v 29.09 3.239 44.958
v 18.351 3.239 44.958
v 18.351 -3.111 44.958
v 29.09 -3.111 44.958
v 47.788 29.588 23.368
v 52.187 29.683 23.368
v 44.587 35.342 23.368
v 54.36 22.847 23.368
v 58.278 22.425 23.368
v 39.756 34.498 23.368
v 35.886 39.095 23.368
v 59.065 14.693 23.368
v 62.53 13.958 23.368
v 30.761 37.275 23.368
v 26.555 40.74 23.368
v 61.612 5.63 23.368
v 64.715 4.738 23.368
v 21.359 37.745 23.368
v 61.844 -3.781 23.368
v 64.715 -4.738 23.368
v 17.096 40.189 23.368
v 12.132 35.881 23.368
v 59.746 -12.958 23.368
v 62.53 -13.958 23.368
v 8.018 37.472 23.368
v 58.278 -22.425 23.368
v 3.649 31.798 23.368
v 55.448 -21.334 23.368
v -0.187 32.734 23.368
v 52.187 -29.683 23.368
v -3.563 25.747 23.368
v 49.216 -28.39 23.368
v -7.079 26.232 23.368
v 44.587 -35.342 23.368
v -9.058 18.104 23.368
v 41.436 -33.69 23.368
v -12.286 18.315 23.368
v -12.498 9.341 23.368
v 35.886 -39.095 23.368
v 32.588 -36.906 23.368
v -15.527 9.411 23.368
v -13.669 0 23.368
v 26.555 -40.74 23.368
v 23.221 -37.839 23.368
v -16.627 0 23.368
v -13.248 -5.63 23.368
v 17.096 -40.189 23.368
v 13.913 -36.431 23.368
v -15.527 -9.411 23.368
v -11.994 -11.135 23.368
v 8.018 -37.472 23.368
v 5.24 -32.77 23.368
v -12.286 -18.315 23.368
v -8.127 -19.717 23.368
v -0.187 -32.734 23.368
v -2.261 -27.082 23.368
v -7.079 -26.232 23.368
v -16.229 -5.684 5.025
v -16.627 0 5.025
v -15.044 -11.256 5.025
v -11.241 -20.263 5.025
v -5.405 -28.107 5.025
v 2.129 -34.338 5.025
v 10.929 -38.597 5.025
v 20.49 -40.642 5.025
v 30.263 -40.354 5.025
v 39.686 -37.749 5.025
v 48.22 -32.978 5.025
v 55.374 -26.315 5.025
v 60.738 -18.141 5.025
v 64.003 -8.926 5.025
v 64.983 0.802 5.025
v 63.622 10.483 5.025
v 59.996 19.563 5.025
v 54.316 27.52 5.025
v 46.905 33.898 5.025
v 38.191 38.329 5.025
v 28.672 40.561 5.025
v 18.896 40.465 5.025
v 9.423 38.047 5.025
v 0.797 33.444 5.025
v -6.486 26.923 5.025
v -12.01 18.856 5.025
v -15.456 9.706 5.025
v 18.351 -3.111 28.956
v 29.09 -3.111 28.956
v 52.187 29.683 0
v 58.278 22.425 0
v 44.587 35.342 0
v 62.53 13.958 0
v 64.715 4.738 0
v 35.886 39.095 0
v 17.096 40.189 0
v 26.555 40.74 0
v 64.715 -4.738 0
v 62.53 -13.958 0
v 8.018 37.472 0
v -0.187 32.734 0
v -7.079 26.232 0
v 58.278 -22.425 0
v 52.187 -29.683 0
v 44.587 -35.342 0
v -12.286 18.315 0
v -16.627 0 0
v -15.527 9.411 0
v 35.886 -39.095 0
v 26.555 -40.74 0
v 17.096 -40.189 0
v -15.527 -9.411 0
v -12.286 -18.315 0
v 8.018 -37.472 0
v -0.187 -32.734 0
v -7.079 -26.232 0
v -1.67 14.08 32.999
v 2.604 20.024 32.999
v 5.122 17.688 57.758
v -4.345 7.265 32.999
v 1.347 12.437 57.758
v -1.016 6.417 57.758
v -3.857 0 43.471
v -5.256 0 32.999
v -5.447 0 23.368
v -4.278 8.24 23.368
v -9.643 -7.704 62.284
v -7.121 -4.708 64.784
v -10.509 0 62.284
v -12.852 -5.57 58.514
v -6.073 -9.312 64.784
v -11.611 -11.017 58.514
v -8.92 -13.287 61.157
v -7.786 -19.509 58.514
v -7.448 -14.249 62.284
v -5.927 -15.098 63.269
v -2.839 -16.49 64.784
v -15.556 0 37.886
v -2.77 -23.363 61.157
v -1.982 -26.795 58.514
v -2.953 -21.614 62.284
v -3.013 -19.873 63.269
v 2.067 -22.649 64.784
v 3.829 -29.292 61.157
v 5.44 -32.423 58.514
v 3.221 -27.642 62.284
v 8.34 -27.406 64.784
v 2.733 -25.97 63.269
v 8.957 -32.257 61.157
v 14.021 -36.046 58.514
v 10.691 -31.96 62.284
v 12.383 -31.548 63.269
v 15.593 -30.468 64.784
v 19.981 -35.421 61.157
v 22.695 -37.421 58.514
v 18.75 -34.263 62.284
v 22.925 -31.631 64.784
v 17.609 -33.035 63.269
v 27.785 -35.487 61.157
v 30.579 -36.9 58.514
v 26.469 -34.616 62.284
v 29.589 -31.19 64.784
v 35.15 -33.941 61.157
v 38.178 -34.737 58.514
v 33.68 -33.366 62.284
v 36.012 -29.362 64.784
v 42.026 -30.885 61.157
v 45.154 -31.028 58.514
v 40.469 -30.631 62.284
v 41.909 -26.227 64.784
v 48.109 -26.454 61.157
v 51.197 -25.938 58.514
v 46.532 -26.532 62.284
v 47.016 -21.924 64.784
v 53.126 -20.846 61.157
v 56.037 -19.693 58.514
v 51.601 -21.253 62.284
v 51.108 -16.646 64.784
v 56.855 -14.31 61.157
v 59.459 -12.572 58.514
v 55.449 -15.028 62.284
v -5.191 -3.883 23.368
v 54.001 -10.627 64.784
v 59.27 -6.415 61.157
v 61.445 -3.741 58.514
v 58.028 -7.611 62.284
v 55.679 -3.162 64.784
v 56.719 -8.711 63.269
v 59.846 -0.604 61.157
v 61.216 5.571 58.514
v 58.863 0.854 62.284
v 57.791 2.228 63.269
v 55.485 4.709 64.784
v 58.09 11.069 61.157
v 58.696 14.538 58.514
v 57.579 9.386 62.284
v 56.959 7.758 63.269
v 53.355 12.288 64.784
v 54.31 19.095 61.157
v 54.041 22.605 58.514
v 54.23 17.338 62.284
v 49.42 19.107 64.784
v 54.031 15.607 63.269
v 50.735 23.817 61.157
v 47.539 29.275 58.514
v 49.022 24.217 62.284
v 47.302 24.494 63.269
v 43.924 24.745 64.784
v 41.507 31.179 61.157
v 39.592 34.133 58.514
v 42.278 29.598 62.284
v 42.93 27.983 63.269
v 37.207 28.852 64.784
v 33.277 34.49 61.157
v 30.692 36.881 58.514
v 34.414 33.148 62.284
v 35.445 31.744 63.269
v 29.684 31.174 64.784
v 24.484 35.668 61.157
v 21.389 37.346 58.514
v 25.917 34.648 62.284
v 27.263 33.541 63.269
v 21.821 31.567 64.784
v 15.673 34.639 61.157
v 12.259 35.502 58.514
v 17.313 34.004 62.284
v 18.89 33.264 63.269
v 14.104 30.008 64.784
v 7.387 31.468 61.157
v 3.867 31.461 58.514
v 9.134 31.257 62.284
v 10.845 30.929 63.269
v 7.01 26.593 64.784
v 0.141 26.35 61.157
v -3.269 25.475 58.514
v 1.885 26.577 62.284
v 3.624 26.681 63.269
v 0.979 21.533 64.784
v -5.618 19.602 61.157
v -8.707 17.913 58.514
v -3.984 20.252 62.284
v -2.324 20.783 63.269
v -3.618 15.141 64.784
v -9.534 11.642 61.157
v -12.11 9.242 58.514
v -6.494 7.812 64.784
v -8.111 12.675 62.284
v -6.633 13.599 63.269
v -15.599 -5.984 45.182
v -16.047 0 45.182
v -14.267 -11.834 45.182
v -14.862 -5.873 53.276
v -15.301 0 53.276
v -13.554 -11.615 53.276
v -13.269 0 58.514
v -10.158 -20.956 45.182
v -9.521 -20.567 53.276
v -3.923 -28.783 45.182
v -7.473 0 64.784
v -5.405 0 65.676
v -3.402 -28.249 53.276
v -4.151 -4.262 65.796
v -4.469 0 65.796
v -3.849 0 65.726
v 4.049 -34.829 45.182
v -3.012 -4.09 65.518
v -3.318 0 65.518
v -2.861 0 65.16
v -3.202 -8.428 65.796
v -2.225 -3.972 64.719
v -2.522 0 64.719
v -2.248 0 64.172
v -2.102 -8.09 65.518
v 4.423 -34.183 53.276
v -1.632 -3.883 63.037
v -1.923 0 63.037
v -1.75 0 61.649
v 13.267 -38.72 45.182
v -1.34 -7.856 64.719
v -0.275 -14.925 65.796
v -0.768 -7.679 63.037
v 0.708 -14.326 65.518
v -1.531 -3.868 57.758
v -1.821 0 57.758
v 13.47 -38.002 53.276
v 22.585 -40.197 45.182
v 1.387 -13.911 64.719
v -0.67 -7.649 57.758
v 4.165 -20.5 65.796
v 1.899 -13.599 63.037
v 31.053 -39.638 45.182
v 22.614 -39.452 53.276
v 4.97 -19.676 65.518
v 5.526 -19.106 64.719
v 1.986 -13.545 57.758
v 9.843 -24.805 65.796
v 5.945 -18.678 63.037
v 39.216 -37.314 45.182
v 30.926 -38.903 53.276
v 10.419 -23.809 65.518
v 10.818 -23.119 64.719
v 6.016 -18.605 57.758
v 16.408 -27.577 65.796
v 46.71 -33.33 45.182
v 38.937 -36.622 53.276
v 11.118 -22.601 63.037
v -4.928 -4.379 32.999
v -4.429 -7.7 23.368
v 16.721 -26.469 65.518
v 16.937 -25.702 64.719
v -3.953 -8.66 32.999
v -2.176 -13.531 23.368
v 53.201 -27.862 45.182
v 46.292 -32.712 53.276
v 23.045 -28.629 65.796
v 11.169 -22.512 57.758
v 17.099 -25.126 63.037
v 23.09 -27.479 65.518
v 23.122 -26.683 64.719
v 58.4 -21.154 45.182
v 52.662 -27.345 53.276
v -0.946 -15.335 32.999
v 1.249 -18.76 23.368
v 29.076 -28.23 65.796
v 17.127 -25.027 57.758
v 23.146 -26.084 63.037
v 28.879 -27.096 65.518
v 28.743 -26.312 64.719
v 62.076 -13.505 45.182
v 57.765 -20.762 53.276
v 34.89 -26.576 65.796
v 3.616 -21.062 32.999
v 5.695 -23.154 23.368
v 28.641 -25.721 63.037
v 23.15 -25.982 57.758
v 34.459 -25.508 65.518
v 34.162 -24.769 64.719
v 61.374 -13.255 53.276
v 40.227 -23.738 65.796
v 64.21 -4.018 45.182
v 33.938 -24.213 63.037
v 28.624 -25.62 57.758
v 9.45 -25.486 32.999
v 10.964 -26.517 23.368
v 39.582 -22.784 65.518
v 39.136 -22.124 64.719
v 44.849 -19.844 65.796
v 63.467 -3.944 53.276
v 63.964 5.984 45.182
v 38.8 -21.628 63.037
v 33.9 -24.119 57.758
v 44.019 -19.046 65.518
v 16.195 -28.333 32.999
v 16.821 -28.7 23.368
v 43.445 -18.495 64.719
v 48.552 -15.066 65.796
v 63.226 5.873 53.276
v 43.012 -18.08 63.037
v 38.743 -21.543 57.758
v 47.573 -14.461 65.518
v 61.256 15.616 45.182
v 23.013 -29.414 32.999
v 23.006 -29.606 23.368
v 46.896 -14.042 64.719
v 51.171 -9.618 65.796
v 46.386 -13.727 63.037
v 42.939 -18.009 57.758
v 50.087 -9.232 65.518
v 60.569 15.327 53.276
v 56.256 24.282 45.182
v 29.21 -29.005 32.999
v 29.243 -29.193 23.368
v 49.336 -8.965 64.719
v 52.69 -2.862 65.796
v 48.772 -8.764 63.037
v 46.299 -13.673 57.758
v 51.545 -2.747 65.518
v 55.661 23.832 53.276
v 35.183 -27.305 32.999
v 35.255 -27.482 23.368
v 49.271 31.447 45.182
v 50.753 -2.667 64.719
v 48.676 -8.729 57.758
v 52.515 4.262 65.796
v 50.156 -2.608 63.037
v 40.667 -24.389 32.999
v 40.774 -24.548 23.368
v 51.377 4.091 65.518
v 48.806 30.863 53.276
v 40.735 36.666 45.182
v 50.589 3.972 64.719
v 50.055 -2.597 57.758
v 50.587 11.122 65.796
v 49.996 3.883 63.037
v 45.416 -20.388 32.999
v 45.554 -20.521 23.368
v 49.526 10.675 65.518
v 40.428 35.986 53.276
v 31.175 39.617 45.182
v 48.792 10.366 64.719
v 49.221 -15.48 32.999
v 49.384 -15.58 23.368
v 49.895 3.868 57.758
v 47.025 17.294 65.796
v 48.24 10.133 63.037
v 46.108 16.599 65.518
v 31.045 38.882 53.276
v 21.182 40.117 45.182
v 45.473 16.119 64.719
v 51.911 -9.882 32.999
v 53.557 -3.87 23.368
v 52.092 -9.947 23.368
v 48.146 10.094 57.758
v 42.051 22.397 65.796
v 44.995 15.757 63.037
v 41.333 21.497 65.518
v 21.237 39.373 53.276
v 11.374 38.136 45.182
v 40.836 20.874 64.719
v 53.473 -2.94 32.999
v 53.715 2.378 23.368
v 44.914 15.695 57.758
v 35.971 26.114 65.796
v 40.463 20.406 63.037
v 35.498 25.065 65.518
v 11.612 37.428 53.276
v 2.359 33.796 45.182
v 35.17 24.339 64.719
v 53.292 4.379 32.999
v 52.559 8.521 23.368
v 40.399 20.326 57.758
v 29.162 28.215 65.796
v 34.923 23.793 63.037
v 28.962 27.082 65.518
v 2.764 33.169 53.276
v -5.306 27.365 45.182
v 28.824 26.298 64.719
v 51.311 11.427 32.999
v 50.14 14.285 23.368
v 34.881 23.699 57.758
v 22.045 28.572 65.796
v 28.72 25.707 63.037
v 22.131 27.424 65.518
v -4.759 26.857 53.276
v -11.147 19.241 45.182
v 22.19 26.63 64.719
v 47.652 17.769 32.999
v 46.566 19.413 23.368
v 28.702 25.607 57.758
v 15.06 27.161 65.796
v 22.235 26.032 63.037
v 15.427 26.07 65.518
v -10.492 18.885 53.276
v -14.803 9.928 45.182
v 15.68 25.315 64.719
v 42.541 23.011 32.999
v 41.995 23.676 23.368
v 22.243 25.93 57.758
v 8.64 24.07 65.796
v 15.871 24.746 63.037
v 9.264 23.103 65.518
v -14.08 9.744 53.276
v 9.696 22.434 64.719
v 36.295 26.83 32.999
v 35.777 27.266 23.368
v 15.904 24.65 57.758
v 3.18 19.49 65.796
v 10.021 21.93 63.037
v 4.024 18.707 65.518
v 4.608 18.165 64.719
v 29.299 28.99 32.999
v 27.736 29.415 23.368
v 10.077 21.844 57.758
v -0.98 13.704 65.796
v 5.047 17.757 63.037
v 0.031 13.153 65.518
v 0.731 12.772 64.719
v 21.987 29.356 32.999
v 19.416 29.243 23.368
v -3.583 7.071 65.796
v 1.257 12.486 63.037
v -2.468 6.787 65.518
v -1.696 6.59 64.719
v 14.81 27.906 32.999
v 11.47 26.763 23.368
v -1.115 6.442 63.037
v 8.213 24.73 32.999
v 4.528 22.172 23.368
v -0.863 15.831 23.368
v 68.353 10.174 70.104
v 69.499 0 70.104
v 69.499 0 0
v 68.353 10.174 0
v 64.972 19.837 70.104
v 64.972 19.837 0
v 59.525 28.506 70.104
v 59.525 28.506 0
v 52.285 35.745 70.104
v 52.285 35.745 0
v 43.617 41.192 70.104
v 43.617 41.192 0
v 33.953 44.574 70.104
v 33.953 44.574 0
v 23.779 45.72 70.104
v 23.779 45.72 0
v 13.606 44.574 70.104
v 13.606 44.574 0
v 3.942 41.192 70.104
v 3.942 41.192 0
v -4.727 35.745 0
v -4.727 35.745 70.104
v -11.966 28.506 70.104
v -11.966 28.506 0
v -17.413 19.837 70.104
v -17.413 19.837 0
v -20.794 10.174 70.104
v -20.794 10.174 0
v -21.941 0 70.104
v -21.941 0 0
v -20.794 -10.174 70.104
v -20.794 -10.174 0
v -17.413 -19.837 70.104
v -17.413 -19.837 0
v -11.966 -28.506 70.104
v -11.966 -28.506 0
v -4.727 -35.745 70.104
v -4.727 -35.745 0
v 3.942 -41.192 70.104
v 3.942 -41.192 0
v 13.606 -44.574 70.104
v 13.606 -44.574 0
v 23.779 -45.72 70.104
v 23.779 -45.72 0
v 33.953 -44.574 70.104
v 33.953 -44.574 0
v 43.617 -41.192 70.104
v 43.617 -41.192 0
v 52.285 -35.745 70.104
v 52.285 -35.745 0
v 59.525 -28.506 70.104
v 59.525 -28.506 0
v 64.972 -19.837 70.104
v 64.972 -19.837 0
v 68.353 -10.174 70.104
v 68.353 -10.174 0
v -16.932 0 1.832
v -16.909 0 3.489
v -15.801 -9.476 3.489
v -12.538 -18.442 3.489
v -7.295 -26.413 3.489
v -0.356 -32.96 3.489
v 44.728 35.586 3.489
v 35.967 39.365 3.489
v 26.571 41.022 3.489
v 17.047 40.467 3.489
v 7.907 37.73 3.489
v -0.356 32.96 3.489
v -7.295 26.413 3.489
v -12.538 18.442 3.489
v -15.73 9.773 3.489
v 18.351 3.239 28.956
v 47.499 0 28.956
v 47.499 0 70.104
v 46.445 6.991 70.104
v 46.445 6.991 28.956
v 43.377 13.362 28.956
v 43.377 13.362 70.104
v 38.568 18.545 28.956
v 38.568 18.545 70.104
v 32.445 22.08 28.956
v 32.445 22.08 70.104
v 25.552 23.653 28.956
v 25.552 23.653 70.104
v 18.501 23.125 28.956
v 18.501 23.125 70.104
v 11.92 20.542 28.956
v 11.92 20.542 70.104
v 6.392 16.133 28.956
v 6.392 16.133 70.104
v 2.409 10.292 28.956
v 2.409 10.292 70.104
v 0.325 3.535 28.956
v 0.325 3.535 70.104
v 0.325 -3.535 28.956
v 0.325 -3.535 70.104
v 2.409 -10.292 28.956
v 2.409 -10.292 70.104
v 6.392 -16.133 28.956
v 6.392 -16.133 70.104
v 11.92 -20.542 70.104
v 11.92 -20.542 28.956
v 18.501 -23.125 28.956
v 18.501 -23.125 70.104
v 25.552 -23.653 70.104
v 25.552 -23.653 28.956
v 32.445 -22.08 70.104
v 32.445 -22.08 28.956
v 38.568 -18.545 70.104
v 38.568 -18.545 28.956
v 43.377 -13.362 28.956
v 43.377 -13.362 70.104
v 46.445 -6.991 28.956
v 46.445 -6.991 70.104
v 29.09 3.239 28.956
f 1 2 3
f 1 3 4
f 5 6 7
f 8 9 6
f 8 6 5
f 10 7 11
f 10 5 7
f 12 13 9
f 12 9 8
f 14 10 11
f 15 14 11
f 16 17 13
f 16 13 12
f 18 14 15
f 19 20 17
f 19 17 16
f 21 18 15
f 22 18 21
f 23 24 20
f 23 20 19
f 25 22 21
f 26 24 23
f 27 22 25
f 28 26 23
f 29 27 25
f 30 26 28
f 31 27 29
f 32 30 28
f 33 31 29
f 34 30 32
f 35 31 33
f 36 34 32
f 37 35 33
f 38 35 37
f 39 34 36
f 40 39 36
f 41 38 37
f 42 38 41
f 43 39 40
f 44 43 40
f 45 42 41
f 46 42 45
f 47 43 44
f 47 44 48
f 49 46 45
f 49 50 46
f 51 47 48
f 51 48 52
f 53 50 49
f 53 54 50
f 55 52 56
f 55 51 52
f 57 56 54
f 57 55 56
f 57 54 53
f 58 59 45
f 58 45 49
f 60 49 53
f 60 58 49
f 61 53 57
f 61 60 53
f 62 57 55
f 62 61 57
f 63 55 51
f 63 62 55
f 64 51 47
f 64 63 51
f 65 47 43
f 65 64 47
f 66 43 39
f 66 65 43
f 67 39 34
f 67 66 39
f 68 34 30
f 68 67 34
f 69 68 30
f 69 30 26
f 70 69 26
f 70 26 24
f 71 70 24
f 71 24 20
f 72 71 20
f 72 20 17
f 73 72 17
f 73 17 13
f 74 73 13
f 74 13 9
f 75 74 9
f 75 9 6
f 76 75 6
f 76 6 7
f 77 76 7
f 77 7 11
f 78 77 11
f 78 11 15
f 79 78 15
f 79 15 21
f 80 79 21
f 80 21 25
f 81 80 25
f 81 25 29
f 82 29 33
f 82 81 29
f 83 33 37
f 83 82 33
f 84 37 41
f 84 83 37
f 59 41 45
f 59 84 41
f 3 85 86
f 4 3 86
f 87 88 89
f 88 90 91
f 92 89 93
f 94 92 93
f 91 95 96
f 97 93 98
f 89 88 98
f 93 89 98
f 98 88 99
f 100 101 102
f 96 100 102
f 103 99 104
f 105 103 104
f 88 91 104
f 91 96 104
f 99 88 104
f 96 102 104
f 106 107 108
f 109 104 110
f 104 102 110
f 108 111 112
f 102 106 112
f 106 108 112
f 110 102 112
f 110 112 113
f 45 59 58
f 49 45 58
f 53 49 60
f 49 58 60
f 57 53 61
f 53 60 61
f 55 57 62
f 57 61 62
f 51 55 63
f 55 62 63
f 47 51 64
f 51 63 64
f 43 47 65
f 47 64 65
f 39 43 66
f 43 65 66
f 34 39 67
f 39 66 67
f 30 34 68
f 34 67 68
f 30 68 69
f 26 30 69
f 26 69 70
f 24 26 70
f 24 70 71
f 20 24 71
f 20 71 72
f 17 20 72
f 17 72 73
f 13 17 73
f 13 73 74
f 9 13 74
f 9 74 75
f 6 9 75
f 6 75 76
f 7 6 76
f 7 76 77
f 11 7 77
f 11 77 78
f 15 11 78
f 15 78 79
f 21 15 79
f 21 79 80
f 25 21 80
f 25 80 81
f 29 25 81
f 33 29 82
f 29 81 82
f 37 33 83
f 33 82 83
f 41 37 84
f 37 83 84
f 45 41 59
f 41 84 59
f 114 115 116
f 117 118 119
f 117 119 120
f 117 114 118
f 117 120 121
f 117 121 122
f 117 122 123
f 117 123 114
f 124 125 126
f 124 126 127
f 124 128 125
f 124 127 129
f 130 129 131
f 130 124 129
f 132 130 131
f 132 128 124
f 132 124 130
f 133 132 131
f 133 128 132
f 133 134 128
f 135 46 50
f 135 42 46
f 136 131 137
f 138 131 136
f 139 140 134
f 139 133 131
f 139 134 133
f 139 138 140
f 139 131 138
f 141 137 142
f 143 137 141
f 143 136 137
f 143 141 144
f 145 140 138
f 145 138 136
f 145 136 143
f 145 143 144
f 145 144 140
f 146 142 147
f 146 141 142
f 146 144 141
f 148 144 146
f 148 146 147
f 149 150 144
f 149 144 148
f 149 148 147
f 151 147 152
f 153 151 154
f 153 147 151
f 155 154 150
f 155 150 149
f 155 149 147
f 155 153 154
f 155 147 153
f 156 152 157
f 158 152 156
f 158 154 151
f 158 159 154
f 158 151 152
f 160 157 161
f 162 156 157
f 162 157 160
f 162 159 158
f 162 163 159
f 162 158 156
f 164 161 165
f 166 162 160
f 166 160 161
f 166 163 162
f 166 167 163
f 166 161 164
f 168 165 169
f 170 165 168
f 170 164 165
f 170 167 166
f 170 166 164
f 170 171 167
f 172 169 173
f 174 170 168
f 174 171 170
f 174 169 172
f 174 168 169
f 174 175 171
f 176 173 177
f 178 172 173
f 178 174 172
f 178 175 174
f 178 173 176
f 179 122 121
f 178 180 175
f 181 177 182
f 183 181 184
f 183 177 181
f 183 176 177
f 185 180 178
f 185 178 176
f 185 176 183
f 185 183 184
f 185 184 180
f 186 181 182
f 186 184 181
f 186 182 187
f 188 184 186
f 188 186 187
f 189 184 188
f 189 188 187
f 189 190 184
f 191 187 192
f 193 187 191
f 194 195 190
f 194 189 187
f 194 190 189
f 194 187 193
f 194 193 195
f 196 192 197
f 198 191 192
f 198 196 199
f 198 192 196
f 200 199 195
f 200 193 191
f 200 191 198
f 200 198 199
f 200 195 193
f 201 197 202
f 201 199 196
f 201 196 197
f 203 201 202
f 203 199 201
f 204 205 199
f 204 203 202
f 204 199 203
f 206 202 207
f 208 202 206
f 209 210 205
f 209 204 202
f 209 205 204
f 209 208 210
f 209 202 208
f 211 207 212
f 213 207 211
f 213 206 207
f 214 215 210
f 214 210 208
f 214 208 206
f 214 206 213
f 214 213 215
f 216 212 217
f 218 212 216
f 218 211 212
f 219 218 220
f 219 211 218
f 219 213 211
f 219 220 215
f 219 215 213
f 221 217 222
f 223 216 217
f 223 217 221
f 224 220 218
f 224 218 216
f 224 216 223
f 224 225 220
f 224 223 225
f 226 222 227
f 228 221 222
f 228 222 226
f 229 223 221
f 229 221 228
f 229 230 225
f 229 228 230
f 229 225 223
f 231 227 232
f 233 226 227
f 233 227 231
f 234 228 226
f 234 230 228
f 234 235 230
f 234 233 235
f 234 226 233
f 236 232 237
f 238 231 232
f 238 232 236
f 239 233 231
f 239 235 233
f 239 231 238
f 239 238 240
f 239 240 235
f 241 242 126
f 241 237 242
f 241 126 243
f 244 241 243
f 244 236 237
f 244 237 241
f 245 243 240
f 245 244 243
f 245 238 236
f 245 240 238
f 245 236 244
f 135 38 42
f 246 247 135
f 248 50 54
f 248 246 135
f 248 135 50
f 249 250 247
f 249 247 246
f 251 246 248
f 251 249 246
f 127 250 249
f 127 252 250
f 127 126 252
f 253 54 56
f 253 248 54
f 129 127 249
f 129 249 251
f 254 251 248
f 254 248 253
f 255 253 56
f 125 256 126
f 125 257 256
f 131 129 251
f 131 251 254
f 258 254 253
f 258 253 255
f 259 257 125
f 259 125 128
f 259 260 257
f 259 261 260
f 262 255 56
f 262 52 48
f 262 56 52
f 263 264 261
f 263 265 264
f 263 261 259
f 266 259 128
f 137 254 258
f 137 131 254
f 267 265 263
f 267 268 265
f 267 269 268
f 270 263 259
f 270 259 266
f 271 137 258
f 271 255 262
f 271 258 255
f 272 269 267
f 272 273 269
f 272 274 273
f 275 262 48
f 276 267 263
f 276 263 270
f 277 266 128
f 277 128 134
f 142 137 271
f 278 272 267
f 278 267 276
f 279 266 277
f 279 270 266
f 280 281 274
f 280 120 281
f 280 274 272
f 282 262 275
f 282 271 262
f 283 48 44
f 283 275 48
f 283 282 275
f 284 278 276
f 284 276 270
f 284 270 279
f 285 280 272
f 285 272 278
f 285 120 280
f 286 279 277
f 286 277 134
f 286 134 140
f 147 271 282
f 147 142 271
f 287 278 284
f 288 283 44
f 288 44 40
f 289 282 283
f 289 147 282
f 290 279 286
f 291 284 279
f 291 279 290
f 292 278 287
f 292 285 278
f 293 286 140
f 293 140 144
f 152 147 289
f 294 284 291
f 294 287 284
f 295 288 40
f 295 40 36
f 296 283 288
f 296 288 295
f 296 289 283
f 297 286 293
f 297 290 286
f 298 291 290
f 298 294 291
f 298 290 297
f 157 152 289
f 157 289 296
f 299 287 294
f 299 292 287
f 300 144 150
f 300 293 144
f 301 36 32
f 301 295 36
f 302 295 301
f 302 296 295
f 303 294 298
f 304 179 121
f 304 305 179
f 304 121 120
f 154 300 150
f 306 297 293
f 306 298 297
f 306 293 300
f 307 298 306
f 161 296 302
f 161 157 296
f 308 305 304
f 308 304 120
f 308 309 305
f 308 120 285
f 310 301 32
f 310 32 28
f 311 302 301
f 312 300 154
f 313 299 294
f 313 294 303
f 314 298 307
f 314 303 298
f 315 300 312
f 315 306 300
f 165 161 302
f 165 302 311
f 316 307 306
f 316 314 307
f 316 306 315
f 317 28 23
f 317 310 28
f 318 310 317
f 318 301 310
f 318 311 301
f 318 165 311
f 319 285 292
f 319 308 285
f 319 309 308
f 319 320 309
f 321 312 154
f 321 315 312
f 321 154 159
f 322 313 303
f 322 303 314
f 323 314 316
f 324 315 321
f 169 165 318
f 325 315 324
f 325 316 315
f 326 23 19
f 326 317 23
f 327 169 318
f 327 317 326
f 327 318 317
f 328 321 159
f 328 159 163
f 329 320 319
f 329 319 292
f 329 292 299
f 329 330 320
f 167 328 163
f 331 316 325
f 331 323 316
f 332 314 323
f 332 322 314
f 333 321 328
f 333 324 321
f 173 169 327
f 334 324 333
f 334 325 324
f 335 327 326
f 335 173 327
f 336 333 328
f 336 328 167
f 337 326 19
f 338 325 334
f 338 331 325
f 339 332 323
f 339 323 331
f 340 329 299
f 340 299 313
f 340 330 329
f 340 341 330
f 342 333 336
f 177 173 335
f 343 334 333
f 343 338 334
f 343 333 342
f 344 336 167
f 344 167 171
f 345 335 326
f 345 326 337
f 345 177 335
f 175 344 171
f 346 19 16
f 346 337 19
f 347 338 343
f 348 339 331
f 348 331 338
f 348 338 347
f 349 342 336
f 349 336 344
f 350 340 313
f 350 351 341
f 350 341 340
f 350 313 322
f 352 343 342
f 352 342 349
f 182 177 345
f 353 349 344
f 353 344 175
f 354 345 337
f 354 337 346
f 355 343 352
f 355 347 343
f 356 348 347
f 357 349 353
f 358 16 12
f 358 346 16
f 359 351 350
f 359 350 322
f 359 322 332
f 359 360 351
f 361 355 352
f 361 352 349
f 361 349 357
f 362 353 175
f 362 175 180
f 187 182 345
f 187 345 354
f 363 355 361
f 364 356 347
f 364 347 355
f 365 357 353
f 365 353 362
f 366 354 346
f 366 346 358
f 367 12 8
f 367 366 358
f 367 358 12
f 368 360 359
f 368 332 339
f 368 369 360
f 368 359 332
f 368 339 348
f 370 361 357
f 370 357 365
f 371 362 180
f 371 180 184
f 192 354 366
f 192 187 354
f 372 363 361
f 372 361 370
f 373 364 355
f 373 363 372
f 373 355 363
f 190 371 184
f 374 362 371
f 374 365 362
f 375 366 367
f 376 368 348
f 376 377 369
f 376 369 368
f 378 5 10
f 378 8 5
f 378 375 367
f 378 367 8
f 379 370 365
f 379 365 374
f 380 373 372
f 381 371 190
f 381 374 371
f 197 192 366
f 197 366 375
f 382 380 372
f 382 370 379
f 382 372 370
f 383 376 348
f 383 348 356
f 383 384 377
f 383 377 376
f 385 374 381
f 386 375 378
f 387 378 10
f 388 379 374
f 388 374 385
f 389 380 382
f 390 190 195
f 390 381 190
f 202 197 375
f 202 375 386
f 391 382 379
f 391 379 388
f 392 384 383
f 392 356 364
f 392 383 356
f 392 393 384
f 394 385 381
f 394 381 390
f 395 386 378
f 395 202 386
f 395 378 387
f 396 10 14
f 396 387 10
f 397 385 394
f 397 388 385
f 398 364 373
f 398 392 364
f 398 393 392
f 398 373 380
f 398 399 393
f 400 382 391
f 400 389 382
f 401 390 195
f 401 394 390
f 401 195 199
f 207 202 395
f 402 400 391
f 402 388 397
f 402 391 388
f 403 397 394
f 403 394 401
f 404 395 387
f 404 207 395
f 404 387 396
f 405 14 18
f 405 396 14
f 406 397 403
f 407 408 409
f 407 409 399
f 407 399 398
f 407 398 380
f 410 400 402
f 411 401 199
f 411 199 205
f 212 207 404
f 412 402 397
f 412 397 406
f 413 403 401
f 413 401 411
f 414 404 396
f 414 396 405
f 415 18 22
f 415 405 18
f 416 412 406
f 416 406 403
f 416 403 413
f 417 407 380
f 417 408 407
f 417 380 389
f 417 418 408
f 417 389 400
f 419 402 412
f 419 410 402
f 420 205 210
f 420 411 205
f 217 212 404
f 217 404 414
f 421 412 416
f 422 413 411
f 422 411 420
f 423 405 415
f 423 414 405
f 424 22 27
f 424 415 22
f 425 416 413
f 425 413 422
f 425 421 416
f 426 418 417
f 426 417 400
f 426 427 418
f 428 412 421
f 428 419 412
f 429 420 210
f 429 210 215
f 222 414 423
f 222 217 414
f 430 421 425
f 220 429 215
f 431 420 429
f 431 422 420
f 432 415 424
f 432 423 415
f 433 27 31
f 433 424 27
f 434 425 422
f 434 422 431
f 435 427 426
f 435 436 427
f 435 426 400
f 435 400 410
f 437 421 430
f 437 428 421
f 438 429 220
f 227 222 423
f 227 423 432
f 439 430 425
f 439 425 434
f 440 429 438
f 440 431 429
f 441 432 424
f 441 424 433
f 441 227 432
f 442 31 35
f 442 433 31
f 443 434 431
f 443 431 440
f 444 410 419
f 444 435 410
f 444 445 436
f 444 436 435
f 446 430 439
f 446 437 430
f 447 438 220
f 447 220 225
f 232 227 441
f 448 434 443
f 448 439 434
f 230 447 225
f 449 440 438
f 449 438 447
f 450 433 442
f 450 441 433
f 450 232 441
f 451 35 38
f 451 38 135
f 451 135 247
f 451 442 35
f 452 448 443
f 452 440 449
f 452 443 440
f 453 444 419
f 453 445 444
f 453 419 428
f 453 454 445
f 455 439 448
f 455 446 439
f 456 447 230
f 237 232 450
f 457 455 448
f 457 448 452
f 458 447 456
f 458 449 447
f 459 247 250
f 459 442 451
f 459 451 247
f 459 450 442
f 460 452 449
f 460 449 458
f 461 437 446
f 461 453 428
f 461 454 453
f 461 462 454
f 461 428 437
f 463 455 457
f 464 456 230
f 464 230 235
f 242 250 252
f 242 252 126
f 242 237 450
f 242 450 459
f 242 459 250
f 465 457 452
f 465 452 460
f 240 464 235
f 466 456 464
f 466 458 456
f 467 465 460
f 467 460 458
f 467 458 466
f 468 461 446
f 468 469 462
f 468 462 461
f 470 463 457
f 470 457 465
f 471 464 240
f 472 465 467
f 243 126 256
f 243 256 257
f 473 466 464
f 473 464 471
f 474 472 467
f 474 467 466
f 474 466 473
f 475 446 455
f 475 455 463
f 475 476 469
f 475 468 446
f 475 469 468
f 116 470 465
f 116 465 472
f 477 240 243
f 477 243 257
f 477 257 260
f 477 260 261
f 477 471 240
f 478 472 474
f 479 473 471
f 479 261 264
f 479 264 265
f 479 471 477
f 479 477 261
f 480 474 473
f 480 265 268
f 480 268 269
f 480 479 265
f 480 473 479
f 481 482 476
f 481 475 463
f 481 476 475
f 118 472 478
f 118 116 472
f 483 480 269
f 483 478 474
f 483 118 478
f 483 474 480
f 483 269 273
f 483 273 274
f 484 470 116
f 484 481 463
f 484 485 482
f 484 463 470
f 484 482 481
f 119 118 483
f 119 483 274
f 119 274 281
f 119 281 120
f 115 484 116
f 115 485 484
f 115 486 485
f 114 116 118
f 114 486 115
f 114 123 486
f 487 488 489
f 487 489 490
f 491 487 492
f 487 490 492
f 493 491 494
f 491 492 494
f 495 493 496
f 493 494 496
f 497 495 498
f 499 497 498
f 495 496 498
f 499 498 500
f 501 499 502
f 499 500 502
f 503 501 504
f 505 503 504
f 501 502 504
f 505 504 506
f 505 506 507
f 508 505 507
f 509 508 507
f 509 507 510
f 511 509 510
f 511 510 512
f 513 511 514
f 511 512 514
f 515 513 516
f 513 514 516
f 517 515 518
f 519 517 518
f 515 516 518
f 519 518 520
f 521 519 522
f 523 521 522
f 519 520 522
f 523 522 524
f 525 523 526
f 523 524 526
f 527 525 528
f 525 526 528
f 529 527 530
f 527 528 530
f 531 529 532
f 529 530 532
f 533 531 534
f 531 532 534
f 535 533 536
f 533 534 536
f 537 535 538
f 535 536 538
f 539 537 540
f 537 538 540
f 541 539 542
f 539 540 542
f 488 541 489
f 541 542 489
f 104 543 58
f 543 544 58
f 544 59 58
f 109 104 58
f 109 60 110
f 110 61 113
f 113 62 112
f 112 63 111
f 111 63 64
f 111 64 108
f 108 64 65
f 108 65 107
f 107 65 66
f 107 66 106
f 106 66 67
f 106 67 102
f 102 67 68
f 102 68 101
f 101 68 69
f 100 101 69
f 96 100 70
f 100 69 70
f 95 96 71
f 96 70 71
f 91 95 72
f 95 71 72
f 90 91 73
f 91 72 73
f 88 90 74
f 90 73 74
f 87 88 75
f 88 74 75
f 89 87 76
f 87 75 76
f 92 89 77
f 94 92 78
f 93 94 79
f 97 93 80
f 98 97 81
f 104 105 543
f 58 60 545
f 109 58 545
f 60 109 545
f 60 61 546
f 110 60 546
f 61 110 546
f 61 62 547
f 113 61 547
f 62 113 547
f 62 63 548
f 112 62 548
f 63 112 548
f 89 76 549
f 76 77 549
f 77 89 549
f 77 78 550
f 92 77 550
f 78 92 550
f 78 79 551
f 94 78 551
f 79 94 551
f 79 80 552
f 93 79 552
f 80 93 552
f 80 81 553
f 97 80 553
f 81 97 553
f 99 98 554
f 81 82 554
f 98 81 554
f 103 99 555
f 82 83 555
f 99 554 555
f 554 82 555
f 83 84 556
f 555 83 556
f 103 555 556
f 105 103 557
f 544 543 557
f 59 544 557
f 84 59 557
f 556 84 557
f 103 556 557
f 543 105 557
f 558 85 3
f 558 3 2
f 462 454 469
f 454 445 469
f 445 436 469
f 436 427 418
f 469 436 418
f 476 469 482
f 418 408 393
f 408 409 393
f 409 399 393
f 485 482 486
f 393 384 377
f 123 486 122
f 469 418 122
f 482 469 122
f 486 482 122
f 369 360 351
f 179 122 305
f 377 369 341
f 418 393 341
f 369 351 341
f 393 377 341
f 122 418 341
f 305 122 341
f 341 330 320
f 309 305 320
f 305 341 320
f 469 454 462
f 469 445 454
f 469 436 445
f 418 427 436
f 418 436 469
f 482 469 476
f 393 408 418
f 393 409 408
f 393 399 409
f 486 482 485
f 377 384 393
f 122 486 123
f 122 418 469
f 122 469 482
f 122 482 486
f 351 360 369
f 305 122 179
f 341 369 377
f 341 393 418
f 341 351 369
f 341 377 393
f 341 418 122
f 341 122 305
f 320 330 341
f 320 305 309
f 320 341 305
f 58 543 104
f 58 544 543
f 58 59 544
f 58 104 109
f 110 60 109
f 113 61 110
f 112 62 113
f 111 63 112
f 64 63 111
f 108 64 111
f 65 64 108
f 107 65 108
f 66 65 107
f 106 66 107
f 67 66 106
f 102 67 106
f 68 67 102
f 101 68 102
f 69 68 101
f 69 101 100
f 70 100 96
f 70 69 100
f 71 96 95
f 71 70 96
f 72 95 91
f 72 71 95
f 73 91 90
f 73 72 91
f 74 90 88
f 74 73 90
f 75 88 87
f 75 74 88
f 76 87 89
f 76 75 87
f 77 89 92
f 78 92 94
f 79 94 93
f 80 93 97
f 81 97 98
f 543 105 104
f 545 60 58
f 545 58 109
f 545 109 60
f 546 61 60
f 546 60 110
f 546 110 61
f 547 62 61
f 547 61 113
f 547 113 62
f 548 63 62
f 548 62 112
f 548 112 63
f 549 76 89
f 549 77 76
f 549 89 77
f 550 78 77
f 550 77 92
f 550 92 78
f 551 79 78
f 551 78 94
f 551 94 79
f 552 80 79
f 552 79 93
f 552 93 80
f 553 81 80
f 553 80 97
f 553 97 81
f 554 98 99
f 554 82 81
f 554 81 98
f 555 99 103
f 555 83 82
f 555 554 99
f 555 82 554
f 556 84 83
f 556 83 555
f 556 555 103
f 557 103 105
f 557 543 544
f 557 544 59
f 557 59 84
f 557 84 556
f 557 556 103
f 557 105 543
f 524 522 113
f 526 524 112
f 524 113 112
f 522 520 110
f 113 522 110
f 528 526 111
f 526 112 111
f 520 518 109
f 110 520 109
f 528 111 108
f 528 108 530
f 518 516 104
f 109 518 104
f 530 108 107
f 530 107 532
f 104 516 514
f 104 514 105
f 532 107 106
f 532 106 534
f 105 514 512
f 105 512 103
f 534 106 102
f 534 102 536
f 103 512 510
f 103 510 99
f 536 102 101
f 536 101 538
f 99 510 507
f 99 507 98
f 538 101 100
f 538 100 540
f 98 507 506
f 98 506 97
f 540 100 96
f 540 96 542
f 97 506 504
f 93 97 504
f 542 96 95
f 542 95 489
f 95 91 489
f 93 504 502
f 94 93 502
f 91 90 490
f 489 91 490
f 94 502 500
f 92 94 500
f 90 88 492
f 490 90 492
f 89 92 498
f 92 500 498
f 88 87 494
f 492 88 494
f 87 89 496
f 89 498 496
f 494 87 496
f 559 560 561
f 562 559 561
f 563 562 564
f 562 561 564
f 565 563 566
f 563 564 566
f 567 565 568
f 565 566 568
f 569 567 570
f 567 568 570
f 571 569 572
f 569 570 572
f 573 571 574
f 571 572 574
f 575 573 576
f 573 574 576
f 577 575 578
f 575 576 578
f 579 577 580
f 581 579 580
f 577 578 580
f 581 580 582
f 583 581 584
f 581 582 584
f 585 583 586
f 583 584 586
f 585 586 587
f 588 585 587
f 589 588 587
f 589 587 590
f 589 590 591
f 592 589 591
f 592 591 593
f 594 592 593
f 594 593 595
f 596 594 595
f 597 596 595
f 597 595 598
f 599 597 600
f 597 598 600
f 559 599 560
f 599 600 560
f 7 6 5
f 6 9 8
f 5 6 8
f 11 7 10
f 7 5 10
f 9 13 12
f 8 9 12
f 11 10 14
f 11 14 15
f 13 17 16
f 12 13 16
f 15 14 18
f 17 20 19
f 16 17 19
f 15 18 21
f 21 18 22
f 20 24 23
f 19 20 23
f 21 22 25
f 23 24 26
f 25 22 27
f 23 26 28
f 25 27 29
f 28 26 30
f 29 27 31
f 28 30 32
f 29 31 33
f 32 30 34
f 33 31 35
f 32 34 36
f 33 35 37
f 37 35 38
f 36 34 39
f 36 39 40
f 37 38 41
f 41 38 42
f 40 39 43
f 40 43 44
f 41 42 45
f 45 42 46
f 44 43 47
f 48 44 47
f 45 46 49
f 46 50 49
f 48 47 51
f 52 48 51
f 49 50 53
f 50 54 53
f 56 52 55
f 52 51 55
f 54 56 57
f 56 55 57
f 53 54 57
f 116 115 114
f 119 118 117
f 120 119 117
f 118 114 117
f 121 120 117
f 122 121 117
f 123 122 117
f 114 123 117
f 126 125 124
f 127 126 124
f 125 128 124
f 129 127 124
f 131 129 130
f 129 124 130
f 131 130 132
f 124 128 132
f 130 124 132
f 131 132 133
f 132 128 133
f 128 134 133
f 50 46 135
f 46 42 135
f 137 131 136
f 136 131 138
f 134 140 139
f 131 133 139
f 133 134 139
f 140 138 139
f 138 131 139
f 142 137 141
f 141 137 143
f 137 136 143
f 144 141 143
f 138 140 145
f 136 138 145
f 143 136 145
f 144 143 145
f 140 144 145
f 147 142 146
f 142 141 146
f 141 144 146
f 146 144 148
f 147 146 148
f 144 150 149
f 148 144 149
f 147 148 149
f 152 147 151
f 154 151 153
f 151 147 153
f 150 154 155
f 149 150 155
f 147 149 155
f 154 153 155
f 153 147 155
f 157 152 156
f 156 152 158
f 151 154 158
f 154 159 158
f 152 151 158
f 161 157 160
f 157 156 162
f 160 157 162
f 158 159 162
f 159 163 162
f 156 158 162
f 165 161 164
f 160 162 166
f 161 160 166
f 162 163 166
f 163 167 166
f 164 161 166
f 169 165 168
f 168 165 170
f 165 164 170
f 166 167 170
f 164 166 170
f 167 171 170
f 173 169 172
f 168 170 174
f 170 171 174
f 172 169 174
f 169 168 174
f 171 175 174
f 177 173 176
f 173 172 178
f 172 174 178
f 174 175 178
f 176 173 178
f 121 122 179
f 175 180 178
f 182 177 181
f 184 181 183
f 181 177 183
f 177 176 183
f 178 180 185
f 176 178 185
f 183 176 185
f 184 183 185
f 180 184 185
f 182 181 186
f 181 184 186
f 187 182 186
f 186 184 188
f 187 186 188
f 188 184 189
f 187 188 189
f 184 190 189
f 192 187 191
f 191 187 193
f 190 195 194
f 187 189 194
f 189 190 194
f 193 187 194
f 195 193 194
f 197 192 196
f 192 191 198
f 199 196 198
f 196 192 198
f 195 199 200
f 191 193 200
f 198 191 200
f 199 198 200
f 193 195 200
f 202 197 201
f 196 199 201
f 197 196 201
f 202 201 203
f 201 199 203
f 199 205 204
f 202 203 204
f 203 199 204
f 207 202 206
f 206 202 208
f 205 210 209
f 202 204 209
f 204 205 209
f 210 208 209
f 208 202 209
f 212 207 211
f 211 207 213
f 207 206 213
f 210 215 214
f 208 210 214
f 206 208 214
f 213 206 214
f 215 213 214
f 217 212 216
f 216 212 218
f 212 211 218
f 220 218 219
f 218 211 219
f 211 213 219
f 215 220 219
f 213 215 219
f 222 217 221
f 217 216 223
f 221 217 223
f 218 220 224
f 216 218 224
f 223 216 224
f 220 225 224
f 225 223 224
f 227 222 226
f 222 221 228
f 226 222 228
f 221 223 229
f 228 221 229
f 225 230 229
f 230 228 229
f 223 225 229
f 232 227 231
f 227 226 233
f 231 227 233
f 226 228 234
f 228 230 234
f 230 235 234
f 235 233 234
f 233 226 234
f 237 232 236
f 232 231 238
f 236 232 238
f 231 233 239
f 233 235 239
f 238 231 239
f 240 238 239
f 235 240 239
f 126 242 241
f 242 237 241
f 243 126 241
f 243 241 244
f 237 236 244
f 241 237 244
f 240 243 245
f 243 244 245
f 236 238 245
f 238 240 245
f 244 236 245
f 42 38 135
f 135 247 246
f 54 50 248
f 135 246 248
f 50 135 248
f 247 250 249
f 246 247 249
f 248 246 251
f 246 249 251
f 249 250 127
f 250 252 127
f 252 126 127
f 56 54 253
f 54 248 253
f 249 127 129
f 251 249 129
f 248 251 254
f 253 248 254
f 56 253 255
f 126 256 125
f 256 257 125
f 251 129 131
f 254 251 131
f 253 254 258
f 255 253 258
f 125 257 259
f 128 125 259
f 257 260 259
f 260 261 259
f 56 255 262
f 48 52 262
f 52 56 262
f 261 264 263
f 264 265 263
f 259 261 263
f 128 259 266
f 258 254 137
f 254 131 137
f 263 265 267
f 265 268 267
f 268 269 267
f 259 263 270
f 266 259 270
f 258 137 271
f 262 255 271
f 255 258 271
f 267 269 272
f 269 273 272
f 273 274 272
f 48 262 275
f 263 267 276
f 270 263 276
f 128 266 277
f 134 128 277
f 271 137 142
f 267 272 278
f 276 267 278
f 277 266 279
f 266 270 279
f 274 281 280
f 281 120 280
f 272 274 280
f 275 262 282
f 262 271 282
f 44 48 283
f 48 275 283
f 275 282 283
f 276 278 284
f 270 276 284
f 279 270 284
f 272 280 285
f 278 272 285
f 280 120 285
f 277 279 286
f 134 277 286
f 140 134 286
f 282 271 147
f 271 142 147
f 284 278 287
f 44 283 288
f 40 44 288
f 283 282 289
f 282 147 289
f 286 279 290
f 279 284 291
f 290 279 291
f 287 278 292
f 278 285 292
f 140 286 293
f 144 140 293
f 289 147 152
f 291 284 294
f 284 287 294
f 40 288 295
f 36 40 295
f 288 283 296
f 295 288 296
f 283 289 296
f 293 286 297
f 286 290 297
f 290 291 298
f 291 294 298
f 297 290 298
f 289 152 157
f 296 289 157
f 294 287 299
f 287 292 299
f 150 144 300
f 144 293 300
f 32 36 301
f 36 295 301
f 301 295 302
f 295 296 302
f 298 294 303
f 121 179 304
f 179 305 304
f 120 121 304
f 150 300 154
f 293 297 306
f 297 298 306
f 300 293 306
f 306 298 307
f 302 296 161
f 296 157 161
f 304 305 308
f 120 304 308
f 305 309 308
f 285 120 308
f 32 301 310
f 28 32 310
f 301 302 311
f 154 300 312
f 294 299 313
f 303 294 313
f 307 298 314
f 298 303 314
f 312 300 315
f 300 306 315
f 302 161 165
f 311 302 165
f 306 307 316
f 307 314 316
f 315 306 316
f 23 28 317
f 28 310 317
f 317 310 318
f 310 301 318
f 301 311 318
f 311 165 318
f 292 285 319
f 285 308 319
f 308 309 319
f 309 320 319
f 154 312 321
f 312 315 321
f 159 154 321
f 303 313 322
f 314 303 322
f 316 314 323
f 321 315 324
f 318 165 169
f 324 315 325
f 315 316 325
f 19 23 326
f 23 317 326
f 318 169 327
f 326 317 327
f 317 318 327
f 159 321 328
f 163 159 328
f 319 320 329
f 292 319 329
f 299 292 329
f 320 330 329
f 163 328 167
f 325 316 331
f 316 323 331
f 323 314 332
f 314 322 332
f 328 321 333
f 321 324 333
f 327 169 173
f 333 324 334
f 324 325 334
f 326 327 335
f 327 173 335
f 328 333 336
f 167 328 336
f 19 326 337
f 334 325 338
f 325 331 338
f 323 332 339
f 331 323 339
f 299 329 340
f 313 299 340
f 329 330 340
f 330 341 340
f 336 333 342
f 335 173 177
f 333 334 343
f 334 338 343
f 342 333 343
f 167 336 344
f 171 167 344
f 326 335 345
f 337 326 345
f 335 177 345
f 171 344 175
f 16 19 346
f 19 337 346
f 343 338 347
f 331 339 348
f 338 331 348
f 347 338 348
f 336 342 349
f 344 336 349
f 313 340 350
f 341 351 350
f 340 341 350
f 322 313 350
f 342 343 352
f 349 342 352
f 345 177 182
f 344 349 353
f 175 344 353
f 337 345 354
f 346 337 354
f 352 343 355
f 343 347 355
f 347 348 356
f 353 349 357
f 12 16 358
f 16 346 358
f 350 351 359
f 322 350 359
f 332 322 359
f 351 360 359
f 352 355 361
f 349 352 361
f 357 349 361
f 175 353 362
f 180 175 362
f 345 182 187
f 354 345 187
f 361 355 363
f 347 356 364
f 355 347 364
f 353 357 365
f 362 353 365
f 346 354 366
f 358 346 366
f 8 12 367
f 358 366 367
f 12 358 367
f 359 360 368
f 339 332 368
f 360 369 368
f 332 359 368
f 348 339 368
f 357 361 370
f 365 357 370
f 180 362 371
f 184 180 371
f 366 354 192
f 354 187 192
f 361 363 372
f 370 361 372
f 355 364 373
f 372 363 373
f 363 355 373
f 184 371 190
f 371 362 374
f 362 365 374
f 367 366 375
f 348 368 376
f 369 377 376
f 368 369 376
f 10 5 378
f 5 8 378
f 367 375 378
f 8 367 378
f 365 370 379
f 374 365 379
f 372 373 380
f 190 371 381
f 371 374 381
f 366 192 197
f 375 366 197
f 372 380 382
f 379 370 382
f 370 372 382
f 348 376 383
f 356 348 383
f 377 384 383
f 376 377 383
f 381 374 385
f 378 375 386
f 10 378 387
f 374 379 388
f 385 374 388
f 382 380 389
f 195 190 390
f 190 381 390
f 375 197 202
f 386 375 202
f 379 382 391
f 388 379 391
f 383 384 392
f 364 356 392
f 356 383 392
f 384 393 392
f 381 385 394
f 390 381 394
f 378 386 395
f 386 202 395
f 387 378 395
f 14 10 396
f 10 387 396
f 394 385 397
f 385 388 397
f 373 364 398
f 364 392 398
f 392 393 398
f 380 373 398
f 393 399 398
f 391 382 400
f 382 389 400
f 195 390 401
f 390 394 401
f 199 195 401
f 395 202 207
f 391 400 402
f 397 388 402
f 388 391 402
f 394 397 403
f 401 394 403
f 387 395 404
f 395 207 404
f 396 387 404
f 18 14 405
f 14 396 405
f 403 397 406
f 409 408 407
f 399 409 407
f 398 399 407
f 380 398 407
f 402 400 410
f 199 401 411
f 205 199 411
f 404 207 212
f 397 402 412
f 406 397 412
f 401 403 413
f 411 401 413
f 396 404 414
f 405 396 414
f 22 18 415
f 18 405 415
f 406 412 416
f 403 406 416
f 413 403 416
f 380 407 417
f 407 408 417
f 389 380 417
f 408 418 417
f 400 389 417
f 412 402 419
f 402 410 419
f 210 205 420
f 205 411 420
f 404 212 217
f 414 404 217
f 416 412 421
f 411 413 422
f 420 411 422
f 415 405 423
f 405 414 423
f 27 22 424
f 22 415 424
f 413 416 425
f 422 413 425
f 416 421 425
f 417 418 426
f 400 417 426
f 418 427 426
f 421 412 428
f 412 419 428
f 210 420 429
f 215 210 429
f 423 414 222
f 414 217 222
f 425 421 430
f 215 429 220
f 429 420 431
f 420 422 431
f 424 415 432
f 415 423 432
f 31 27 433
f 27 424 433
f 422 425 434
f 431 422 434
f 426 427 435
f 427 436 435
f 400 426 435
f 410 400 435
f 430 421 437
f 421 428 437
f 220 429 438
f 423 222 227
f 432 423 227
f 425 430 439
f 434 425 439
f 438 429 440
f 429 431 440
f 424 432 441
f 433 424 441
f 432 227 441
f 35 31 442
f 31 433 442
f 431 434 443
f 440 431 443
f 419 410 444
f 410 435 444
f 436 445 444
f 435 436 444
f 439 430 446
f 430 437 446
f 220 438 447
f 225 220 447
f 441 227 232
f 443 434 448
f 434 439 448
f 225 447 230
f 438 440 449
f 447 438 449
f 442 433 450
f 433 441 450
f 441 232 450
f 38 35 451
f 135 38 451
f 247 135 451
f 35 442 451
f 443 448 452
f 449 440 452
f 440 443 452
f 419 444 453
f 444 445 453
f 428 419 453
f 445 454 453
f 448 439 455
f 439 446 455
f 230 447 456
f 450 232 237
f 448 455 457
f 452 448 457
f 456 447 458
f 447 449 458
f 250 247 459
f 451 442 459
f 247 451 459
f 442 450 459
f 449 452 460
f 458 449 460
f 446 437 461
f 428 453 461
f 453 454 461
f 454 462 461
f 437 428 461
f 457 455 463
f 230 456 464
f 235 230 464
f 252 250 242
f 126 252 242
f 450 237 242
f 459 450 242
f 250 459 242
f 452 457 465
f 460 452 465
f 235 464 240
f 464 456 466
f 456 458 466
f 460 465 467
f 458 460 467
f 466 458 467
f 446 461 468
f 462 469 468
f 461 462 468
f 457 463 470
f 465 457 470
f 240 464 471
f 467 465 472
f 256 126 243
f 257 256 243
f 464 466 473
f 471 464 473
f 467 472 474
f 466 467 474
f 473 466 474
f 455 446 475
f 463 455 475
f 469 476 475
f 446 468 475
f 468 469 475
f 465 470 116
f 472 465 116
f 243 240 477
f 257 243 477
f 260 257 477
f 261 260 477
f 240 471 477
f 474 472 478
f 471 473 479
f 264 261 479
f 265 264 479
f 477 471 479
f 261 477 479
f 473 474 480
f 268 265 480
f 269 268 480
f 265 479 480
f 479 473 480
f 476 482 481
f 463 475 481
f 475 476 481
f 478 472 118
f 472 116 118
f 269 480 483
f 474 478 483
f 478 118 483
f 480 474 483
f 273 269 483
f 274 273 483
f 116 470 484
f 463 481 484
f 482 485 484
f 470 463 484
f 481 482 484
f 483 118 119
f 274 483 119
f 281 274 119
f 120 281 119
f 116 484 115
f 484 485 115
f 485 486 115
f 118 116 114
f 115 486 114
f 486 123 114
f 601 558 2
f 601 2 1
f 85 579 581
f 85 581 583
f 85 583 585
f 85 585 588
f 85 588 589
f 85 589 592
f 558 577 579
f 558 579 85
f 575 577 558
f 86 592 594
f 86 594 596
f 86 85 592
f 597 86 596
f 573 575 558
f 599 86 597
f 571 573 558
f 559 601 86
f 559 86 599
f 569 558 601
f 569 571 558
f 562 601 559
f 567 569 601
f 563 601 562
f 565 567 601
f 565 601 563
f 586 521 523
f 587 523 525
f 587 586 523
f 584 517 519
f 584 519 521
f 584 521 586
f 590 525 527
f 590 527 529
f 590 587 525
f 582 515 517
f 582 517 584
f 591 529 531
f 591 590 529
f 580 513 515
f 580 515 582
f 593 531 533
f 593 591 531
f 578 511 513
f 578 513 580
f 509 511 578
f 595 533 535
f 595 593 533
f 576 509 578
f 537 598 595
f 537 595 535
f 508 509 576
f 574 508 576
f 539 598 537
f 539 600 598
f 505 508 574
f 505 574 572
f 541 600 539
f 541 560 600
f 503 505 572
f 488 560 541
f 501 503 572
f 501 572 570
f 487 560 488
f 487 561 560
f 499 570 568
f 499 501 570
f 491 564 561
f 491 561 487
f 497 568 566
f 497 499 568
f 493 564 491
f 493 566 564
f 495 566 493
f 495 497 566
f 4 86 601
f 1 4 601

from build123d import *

# Parameters (mm, degrees)
F2_DEPTH  = 23.368
F3_R      = 19.05
F4_DEPTH  = 23.368
F5_R      = 45.72
F7_DEPTH  = 70.104
F9_R      = 23.719607247
F10_DEPTH = 41.148
F11_W     = 10.7389709225
F11_H     = 6.35
F12_DEPTH = 16.002


with BuildPart() as f1:
    # F0 (on Front) → F1 (revolve)
    with BuildSketch(Plane.XZ):
        with BuildLine():
            add(Edge.make_bspline(
                [(-16.627009958, 0), (-18.0772602361, 5.6939754485), (-8.1733478633, 12.9405576476), (-22.6632878538, 54.7008080209), (0.2552988546, 71.565440241), (-3.0527665968, 46.8541765253), (-9.3779117115, 12.9052271011), (6.197588378, 8.2035341), (11.1485021189, 0)],
                knots=[0, 0, 0, 0, 0.1338252326, 0.3556902436, 0.4938556362, 0.6372934006, 0.8353308376, 1, 1, 1, 1], degree=3))
            Line((-16.627009958, 0), (11.1485021189, 0))
        make_face()
    revolve(axis=Axis((24.1821091622, 0, 15.6086506322), (0, 0, 1)))

    # F2 (add): a face of the model
    f2_faces = [f1.faces().sort_by_distance(p)[0] for p in [
        (38.3699724001, 0, 0),
    ]]
    extrude(f2_faces, amount=-F2_DEPTH)

    # F3 (on Top) → F4 (join, through all)
    with BuildSketch(Plane.XY):
        with Locations((26.25008593, 0)):
            Circle(F3_R)
    extrude(amount=F4_DEPTH)


with BuildPart() as f6_1:
    # F6: copy of F1
    add(f1.part)


with BuildPart() as f7:
    # F5 (on Top) → F7 (new body)
    with BuildSketch(Plane.XY):
        with Locations((23.779436988, 0)):
            Circle(F5_R)
    extrude(amount=F7_DEPTH)

    # F8: cut F1
    add(f1.part, mode=Mode.SUBTRACT)

    # F9 (on face) → F10 (cut)
    with BuildSketch(Plane.XY.offset(70.104)):
        with Locations((23.779436988, 0)):
            Circle(F9_R)
    extrude(amount=-F10_DEPTH, mode=Mode.SUBTRACT)

    # F11 (on face) → F12 (join)
    with BuildSketch(Plane.XY.offset(28.956)):
        with Locations((23.7203221768, 0.0640891958)):
            Rectangle(F11_W, F11_H)
    extrude(amount=F12_DEPTH)


solid = Compound([f6_1.part, f7.part])
